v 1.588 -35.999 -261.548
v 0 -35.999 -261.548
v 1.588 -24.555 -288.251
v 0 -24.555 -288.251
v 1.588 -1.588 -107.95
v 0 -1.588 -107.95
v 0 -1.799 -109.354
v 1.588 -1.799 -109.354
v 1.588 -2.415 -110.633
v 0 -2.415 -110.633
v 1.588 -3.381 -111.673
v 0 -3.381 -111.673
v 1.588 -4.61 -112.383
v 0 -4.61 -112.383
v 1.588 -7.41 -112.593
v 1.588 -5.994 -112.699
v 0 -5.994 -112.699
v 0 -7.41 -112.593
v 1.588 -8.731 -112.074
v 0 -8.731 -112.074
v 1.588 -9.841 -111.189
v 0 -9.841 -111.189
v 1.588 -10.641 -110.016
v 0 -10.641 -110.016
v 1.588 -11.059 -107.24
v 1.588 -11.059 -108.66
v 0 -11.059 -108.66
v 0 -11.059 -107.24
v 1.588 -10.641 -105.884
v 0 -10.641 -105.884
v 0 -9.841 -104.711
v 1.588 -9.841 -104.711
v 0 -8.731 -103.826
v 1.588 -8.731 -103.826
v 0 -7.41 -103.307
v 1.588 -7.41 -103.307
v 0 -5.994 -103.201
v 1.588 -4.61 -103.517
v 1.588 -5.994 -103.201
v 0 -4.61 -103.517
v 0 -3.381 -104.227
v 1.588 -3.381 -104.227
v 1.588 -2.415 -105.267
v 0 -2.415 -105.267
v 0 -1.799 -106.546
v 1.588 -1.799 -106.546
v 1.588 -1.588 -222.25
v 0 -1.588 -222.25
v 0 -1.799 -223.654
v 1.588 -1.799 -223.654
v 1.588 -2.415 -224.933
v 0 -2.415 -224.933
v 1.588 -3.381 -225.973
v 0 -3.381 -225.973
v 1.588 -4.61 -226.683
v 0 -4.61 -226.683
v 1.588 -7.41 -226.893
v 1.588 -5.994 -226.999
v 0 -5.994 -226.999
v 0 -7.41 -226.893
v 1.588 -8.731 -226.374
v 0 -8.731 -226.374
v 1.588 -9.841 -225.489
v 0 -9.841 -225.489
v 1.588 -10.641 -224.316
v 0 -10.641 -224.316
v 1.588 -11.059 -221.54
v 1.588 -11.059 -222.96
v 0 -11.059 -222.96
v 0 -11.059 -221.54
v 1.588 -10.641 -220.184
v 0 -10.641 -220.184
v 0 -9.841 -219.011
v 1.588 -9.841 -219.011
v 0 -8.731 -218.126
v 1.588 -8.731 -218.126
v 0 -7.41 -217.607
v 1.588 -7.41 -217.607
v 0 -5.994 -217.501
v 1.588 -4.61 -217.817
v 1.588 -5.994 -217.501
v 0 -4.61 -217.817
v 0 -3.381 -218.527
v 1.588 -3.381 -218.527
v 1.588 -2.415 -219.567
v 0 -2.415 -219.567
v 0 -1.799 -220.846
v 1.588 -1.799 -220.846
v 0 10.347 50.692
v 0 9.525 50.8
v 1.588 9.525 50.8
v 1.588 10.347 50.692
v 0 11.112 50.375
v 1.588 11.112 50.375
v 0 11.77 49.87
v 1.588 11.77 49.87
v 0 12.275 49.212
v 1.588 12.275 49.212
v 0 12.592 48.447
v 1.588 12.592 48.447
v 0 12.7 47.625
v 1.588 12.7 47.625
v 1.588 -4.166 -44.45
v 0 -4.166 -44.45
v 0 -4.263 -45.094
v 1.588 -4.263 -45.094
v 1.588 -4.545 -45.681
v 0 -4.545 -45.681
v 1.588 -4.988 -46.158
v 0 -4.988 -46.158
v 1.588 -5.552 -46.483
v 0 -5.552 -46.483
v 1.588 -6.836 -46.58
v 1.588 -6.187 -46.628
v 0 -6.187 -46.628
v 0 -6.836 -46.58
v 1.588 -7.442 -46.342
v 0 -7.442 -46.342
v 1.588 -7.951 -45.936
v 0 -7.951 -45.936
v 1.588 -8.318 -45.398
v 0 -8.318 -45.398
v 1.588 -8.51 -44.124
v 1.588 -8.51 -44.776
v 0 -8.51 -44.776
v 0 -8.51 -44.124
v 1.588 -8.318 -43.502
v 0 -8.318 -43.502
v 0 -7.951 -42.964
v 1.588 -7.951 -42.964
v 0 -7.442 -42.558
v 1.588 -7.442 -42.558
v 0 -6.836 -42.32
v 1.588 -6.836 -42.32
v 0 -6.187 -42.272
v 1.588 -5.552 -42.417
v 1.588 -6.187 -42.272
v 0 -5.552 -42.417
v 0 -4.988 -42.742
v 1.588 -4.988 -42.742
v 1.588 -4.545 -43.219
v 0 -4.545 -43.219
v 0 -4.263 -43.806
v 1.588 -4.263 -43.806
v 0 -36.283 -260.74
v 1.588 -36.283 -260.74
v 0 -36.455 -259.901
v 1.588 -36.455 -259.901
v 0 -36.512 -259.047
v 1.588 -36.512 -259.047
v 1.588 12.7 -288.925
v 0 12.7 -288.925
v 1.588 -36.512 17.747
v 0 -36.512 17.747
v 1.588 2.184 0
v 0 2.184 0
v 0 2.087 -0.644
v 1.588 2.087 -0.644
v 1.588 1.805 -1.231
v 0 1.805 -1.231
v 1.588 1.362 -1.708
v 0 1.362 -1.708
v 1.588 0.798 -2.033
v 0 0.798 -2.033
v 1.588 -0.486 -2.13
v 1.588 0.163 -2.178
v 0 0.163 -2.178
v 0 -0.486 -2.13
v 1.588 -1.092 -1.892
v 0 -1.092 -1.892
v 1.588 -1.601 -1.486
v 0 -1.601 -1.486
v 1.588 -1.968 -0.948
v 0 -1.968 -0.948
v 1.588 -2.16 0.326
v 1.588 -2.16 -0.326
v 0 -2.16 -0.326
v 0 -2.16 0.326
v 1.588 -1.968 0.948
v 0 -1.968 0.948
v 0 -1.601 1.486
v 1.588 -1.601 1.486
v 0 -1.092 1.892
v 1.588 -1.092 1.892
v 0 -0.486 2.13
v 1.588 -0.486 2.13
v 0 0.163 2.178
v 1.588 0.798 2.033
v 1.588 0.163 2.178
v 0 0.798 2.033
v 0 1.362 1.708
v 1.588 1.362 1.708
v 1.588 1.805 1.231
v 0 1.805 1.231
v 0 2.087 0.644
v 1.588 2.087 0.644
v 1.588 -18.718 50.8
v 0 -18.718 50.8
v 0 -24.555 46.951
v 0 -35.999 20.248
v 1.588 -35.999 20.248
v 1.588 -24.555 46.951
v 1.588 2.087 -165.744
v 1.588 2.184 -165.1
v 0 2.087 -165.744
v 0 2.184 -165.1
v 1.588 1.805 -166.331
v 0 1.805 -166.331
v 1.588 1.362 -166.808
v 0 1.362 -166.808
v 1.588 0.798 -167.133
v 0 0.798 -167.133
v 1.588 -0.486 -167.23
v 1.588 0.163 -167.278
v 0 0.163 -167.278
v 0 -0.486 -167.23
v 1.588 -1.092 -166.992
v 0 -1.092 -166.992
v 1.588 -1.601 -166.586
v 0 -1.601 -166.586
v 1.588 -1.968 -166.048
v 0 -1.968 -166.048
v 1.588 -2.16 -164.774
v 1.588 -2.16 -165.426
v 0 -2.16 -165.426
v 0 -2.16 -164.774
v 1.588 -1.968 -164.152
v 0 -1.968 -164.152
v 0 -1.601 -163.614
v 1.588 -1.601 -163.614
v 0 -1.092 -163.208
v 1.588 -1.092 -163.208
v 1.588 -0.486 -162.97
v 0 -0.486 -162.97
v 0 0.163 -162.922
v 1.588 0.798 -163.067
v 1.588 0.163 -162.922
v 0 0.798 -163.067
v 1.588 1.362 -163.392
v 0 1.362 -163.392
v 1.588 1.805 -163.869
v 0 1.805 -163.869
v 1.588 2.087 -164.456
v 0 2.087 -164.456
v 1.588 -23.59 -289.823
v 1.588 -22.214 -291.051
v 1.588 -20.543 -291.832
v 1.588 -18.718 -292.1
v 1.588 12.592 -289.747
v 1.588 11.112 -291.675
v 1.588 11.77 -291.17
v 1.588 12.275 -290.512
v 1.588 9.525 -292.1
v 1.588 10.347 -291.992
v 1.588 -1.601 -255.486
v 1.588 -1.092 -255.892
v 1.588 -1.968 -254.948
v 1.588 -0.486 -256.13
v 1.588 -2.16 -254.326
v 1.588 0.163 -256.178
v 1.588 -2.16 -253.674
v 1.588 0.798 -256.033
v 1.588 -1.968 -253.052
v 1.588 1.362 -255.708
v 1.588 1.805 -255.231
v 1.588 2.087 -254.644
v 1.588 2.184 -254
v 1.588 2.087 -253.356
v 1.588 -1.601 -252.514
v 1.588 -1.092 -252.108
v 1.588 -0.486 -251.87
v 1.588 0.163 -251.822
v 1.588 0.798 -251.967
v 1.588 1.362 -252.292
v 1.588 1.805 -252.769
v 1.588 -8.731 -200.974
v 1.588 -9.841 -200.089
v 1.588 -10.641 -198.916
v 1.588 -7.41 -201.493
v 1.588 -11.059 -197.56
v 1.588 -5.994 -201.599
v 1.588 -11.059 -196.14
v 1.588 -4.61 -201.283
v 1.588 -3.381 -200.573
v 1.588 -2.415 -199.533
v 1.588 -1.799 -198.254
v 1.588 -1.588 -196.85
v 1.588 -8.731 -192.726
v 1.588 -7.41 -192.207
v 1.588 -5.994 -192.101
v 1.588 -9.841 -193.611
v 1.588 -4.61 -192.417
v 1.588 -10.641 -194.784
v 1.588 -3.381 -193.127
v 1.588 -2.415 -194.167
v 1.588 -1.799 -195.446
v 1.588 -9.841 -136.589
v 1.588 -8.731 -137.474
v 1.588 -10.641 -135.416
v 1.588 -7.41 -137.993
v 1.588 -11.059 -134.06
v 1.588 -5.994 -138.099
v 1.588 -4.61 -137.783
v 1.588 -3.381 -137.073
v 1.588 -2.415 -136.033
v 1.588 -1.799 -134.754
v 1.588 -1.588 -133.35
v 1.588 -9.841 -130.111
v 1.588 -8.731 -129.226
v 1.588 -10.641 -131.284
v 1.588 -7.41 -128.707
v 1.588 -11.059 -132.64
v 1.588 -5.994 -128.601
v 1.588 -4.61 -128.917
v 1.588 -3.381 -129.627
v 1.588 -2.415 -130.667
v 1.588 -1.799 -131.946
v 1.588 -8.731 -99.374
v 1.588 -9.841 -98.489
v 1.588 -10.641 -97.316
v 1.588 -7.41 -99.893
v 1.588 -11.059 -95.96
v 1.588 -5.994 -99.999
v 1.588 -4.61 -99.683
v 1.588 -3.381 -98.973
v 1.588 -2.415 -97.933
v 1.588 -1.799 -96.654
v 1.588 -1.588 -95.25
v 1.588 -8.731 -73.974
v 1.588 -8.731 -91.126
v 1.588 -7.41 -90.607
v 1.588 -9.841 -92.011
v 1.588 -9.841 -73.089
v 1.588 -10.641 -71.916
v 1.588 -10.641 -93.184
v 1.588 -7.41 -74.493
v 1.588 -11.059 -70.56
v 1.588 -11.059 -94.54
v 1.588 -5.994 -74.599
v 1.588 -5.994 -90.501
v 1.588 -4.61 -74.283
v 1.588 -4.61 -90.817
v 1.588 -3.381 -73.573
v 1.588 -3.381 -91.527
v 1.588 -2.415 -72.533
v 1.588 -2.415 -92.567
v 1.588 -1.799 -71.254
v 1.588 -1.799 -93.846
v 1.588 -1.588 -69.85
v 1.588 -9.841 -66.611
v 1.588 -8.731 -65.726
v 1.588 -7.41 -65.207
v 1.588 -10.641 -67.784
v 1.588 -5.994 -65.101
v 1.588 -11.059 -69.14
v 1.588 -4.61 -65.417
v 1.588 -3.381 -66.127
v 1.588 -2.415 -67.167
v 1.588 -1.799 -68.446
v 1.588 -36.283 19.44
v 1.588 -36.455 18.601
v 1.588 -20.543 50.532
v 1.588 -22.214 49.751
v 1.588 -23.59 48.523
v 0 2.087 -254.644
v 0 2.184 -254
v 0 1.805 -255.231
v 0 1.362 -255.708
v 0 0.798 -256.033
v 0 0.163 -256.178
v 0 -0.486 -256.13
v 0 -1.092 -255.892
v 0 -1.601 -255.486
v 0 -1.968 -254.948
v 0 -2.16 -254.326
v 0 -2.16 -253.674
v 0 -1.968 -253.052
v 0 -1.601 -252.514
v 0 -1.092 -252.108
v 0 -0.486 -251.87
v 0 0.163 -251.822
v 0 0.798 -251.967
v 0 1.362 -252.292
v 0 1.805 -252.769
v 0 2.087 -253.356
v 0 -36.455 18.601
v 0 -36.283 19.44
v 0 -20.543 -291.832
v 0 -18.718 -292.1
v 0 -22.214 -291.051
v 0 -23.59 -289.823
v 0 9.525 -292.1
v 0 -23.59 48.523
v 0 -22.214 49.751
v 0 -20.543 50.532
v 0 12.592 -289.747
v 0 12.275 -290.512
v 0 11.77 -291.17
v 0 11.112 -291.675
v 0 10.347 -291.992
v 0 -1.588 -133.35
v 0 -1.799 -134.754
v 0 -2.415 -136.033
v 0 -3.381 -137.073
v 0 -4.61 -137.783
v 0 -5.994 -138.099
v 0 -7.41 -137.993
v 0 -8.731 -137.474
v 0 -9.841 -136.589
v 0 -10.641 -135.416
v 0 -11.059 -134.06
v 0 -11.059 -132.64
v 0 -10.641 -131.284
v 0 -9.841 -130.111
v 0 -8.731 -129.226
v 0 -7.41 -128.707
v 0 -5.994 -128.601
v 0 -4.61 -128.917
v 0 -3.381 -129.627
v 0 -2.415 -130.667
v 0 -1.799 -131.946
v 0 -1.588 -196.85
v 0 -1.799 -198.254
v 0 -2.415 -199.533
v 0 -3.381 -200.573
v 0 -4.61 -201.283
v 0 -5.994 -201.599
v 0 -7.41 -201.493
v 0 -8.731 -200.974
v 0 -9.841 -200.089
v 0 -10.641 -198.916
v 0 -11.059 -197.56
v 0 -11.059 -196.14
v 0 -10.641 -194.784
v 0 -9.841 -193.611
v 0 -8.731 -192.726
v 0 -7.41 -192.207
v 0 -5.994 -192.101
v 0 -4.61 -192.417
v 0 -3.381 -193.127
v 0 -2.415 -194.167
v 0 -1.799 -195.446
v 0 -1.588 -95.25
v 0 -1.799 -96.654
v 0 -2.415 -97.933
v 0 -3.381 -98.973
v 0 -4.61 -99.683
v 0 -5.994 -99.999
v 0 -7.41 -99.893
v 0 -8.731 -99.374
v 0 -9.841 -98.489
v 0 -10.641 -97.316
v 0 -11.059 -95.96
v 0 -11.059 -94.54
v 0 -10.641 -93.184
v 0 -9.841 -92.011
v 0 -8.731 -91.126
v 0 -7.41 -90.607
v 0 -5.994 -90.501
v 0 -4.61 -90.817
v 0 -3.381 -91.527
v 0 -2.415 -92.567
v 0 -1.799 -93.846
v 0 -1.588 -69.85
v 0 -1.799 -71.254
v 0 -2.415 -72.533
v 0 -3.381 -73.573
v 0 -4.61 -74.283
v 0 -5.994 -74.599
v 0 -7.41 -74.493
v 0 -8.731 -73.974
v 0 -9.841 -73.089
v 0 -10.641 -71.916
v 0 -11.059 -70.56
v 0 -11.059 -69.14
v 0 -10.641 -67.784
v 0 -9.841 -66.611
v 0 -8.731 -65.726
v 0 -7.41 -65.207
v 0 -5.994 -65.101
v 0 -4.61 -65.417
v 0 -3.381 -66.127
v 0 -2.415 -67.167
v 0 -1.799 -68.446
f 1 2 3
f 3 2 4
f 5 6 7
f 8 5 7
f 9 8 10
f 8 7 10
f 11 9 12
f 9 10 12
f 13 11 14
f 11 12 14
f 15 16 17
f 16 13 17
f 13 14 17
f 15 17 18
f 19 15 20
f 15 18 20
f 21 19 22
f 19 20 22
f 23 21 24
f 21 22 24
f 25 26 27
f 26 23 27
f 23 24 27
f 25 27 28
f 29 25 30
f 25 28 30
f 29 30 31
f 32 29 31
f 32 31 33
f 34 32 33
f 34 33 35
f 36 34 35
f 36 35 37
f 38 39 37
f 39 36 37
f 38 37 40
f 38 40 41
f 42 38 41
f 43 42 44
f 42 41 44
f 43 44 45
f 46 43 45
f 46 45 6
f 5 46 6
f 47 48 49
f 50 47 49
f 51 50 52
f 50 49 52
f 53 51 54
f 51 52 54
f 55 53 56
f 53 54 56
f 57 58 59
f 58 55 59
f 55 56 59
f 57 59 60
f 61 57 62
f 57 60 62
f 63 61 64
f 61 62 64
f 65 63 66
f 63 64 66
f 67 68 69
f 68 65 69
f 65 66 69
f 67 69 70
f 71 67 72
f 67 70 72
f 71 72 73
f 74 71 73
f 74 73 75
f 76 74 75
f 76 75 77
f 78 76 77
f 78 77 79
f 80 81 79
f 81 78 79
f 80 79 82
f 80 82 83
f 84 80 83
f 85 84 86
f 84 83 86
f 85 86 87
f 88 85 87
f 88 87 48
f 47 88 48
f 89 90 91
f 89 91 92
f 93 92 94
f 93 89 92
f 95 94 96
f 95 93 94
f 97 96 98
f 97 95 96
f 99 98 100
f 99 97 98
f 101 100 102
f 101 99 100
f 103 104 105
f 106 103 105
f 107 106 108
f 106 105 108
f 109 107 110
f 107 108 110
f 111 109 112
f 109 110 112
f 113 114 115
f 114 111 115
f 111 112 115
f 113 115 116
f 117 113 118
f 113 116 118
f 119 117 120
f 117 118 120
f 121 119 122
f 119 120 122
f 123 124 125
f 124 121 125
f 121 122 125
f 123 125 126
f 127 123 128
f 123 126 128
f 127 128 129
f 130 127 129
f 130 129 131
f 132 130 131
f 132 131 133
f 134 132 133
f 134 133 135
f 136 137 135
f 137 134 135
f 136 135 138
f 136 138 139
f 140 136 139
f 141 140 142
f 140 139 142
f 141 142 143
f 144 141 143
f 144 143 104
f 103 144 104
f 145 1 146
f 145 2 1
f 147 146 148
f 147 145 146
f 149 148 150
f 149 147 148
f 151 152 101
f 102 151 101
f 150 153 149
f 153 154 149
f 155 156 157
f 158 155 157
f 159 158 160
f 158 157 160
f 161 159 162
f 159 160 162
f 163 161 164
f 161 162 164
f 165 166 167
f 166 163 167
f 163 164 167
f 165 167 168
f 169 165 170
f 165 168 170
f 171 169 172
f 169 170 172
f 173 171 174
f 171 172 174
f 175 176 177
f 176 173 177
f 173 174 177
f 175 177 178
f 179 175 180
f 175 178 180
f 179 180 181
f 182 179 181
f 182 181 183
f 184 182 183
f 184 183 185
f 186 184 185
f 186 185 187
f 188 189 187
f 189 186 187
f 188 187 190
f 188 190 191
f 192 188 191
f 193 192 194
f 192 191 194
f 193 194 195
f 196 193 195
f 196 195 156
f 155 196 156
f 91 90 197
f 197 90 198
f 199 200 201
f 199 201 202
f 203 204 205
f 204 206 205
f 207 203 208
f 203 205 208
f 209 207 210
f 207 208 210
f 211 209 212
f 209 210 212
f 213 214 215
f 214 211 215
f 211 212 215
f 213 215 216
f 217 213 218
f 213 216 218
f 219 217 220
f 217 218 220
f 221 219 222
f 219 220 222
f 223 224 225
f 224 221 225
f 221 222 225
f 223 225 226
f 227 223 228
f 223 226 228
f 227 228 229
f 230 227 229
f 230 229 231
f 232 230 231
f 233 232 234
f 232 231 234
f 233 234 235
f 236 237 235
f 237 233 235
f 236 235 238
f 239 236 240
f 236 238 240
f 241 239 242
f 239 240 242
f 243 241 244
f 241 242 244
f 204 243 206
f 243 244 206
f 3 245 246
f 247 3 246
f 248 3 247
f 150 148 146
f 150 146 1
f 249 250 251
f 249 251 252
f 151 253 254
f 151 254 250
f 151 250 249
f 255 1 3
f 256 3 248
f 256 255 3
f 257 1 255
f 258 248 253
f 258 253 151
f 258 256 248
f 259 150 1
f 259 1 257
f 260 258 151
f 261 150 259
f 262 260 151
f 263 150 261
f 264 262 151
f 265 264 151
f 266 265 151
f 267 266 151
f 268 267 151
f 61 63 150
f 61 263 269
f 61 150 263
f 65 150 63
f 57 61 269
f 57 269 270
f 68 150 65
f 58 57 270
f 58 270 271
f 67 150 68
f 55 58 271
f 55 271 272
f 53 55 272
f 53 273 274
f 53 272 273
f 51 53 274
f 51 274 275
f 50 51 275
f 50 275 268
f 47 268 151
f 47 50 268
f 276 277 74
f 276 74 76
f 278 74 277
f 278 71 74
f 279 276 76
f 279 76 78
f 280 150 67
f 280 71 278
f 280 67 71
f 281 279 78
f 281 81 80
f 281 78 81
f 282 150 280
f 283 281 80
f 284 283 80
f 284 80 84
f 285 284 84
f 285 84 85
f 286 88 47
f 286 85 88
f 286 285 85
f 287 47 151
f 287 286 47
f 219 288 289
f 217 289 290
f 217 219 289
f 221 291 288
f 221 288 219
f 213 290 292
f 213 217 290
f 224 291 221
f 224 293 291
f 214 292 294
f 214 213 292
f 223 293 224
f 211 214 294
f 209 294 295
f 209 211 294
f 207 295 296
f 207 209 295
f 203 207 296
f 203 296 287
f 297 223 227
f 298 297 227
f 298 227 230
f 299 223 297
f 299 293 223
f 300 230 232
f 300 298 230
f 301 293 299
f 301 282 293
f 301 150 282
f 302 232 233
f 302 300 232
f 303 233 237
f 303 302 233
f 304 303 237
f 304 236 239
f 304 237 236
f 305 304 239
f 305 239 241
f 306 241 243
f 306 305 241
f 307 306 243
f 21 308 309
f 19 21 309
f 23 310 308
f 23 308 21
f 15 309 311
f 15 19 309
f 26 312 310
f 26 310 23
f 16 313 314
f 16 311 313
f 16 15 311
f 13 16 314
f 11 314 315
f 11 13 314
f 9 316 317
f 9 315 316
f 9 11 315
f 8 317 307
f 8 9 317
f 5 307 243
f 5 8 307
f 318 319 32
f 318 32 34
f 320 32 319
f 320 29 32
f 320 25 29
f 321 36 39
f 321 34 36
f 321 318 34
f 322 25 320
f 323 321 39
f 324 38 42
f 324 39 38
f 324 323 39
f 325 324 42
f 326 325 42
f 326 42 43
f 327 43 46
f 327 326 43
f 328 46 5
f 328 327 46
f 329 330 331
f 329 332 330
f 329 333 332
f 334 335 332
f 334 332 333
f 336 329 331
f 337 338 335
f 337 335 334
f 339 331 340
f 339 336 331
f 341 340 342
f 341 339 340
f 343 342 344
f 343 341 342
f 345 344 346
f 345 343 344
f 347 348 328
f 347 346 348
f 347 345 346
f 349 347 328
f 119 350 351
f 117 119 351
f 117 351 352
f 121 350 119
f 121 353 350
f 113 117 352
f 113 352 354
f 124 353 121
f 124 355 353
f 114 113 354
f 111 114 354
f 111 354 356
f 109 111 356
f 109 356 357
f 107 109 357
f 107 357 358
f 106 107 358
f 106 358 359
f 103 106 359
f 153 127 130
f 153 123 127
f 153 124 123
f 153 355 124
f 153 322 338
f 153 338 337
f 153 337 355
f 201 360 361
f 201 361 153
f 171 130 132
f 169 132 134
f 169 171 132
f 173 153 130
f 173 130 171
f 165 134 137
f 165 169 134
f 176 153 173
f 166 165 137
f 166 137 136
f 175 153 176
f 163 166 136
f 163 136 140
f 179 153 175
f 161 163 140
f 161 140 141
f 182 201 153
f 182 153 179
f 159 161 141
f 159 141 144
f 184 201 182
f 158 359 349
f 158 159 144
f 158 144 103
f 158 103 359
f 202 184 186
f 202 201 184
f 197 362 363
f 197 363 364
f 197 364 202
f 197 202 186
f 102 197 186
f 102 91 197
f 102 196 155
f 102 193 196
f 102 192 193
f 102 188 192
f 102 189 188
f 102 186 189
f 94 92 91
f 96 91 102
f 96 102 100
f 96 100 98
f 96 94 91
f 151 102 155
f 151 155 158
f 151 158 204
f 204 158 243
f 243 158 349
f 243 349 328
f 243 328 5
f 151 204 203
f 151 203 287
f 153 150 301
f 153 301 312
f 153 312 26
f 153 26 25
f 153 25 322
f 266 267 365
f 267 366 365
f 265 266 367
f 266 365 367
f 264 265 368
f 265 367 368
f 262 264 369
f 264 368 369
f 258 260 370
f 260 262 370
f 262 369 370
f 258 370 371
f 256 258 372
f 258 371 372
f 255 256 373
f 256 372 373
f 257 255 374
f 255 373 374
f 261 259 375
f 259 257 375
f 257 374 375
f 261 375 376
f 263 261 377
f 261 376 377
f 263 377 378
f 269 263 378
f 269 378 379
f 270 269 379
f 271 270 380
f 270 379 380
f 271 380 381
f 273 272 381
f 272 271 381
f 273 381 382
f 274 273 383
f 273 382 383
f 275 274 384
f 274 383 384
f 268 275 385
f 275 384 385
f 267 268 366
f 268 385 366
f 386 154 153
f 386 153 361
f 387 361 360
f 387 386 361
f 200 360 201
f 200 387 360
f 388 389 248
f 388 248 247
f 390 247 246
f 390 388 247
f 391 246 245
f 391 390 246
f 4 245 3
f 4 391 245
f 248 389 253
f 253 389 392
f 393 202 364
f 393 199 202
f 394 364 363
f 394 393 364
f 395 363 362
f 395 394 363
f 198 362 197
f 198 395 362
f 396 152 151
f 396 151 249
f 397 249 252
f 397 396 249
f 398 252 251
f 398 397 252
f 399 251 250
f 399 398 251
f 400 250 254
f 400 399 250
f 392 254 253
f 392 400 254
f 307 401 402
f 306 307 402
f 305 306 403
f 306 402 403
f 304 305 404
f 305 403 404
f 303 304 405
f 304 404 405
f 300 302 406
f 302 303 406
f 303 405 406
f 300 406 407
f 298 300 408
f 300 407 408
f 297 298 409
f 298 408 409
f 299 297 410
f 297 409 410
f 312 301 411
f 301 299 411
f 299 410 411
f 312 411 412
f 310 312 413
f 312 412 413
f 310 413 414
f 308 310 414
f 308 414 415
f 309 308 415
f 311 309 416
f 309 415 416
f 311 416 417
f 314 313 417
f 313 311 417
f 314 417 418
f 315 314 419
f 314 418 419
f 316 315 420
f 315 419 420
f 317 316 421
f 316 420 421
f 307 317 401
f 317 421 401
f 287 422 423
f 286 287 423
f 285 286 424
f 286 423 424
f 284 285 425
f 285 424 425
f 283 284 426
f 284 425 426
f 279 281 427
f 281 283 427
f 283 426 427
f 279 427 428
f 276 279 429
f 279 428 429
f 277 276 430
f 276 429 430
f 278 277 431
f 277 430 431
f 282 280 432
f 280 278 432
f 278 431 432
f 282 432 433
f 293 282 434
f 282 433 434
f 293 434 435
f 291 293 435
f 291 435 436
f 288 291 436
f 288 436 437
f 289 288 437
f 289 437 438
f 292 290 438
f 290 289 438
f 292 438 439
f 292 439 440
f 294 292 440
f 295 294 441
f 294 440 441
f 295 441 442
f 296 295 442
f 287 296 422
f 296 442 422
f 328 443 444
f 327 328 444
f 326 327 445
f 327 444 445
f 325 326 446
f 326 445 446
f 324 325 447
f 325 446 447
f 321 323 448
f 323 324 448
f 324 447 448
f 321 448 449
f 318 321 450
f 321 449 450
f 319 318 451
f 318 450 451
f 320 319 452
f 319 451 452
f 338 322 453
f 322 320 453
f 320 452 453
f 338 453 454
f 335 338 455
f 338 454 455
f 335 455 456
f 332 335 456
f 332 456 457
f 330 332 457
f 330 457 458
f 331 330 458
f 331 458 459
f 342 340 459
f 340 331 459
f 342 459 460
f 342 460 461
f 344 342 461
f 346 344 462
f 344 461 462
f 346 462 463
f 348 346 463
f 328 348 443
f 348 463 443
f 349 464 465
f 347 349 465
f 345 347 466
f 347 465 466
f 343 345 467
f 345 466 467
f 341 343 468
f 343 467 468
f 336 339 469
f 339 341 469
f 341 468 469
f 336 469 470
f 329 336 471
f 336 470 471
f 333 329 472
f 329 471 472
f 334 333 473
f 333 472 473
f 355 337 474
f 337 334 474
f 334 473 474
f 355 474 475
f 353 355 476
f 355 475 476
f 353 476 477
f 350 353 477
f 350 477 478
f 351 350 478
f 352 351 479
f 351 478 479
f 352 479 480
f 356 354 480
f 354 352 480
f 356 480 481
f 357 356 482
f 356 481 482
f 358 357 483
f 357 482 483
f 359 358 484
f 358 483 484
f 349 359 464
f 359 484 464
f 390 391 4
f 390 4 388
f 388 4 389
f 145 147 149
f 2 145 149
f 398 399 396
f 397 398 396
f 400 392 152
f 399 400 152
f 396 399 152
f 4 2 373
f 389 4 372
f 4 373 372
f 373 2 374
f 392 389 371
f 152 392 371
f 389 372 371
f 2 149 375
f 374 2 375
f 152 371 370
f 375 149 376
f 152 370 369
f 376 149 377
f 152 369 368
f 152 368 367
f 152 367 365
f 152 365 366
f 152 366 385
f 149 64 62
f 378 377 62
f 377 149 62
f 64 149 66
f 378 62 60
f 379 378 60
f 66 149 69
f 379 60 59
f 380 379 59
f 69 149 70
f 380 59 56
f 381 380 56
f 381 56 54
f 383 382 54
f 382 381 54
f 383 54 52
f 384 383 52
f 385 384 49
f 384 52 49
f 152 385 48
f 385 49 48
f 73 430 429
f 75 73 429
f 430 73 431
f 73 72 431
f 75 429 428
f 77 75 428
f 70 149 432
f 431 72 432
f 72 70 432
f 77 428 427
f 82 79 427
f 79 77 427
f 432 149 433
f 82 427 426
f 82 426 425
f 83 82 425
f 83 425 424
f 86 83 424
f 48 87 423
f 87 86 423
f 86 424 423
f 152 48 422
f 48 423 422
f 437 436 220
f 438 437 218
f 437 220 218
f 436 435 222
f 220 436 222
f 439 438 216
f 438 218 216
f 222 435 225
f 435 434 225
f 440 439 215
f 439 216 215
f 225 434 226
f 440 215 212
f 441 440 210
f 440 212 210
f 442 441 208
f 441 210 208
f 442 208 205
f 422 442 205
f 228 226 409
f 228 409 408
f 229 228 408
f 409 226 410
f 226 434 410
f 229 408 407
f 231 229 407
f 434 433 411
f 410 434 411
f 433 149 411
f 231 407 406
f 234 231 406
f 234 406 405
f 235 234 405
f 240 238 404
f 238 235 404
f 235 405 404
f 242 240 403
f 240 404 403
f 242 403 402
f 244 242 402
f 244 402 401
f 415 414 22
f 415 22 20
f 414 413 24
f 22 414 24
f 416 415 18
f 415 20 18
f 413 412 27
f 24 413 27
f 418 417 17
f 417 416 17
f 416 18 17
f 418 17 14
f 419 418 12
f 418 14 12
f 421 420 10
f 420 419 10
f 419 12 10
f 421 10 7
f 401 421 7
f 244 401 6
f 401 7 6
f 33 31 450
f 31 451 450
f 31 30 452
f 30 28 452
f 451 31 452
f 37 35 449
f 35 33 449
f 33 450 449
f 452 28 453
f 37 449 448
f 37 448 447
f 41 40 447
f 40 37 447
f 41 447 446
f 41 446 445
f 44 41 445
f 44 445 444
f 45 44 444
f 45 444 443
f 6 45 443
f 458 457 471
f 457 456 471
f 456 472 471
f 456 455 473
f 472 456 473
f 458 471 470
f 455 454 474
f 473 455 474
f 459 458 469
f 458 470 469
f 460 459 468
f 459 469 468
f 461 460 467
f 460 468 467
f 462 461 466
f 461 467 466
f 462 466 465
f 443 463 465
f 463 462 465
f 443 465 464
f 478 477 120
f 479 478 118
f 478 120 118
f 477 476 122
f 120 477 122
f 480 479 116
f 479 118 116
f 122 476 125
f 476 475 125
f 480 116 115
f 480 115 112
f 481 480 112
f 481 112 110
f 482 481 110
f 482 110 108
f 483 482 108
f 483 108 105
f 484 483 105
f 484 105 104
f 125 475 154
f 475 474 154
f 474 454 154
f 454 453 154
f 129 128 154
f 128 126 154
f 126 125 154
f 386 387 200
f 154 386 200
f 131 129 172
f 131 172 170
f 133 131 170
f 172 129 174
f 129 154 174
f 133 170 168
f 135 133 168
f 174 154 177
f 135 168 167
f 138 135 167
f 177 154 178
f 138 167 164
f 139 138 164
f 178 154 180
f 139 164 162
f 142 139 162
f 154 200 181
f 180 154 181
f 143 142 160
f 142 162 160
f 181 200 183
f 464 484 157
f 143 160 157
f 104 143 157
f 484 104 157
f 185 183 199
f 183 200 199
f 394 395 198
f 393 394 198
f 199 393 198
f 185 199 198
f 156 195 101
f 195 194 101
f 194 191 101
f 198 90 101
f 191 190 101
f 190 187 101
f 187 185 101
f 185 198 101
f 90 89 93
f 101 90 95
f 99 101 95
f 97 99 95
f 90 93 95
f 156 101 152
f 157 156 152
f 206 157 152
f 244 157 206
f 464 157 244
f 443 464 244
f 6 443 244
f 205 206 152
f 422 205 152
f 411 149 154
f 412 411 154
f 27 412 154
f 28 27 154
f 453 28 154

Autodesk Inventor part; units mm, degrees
ref_plane "YZ Plane" through (0, 0, 0) normal (1, 0, 0) x (0, 1, 0)
ref_plane "XZ Plane" through (0, 0, 0) normal (0, 1, 0) x (-1, 0, 0)
ref_plane "XY Plane" through (0, 0, 0) normal (0, 0, 1) x (1, 0, 0)
sketch "skirt" plane through (0, 0, 0) normal (0, 0, 1) x (1, 0, 0)
  circle A0 centre (5.0031, 25.9038) radius 4.7625
  line L0 (24.0531, -155.0712) -> (24.0531, 181.4788)
  line L1 (-25.1594, 151.6004) -> (-25.1594, -125.1928)
  circle A1 centre (11.3531, 133.8538) radius 2.1844
  arc A2 (24.0531, 181.4788) -> (20.8781, 184.6538) centre (20.8781, 181.4788) ccw
  line L2 (20.8781, 184.6538) -> (-7.3651, 184.6538)
  line L3 (-24.646, 154.1018) -> (-13.2017, 180.8052)
  arc A3 (-7.3651, 184.6538) -> (-13.2017, 180.8052) centre (-7.3651, 178.3038) ccw
  arc A4 (-24.646, 154.1018) -> (-25.1594, 151.6004) centre (-18.8094, 151.6004) ccw
  line L4 (-24.646, -127.6942) -> (-13.2017, -154.3976)
  line L5 (-7.3651, -158.2462) -> (20.8781, -158.2462)
  arc A5 (20.8781, -158.2462) -> (24.0531, -155.0712) centre (20.8781, -155.0712) ccw
  arc A6 (-25.1594, -125.1928) -> (-24.646, -127.6942) centre (-18.8094, -125.1928) ccw
  circle A7 centre (11.3531, -120.1462) radius 2.1844
  arc A8 (-13.2017, -154.3976) -> (-7.3651, -158.2462) centre (-7.3651, -151.8962) ccw
  circle A9 centre (5.0031, 64.0038) radius 4.7625
  circle A10 centre (5.0031, 38.6038) radius 4.7625
  circle A11 centre (5.0031, 0.5038) radius 4.7625
  circle A12 centre (11.3531, -31.2462) radius 2.1844
  circle A13 centre (5.0031, -62.9962) radius 4.7625
  circle A14 centre (5.0031, -88.3962) radius 4.7625
  circle A15 centre (5.0031, 89.4038) radius 2.1844
  point P0 (-0.9322, -0.2017)
  point P1 (5.0031, 51.3038)
  point P2 (-25.1594, 152.9038)
  point P3 (-25.1594, -126.4962)
  point P4 (5.0031, -12.1962)
  point P5 (5.0031, 13.2038)
  dimension "d0" = 279.4
  dimension "d1" = 49.2125
  dimension "d2" = 3.175
  dimension "d3" = 113.199
  dimension "d4" = 113.199
  dimension "d5" = 6.35
  dimension "d7" = 9.525
  dimension "d13" = 50.8
  dimension "d14" = 38.1
  dimension "d16" = 4.3688
  dimension "d17" = 31.75
  dimension "d18" = 4.3688
sketch "Sketch1" plane through (0, 0, 0) normal (1, 0, 0) x (0, 1, 0)
  circle A0 centre (-6.35, -107.95) radius 4.7625
  line L0 (12.7, -288.925) -> (12.7, 47.625)
  line L1 (-36.5125, 17.7466) -> (-36.5125, -259.0466)
  circle A1 centre (0, 0) radius 2.1844
  arc A2 (12.7, 47.625) -> (9.525, 50.8) centre (9.525, 47.625) ccw
  line L2 (9.525, 50.8) -> (-18.7182, 50.8)
  line L3 (-35.9991, 20.248) -> (-24.5548, 46.9514)
  arc A3 (-18.7182, 50.8) -> (-24.5548, 46.9514) centre (-18.7182, 44.45) ccw
  arc A4 (-35.9991, 20.248) -> (-36.5125, 17.7466) centre (-30.1625, 17.7466) ccw
  line L4 (-35.9991, -261.548) -> (-24.5548, -288.2514)
  line L5 (-18.7182, -292.1) -> (9.525, -292.1)
  arc A5 (9.525, -292.1) -> (12.7, -288.925) centre (9.525, -288.925) ccw
  arc A6 (-36.5125, -259.0466) -> (-35.9991, -261.548) centre (-30.1625, -259.0466) ccw
  circle A7 centre (0, -254) radius 2.1844
  arc A8 (-24.5548, -288.2514) -> (-18.7182, -292.1) centre (-18.7182, -285.75) ccw
  circle A9 centre (-6.35, -69.85) radius 4.7625
  circle A10 centre (-6.35, -95.25) radius 4.7625
  circle A11 centre (-6.35, -133.35) radius 4.7625
  circle A12 centre (0, -165.1) radius 2.1844
  circle A13 centre (-6.35, -196.85) radius 4.7625
  circle A14 centre (-6.35, -222.25) radius 4.7625
  circle A15 centre (-6.35, -44.45) radius 2.1844
extrude "Extrusion1" add sketch "Sketch1" along normal blind 1.5875
properties part number "Skirt" material "Acetal Resin, White"
